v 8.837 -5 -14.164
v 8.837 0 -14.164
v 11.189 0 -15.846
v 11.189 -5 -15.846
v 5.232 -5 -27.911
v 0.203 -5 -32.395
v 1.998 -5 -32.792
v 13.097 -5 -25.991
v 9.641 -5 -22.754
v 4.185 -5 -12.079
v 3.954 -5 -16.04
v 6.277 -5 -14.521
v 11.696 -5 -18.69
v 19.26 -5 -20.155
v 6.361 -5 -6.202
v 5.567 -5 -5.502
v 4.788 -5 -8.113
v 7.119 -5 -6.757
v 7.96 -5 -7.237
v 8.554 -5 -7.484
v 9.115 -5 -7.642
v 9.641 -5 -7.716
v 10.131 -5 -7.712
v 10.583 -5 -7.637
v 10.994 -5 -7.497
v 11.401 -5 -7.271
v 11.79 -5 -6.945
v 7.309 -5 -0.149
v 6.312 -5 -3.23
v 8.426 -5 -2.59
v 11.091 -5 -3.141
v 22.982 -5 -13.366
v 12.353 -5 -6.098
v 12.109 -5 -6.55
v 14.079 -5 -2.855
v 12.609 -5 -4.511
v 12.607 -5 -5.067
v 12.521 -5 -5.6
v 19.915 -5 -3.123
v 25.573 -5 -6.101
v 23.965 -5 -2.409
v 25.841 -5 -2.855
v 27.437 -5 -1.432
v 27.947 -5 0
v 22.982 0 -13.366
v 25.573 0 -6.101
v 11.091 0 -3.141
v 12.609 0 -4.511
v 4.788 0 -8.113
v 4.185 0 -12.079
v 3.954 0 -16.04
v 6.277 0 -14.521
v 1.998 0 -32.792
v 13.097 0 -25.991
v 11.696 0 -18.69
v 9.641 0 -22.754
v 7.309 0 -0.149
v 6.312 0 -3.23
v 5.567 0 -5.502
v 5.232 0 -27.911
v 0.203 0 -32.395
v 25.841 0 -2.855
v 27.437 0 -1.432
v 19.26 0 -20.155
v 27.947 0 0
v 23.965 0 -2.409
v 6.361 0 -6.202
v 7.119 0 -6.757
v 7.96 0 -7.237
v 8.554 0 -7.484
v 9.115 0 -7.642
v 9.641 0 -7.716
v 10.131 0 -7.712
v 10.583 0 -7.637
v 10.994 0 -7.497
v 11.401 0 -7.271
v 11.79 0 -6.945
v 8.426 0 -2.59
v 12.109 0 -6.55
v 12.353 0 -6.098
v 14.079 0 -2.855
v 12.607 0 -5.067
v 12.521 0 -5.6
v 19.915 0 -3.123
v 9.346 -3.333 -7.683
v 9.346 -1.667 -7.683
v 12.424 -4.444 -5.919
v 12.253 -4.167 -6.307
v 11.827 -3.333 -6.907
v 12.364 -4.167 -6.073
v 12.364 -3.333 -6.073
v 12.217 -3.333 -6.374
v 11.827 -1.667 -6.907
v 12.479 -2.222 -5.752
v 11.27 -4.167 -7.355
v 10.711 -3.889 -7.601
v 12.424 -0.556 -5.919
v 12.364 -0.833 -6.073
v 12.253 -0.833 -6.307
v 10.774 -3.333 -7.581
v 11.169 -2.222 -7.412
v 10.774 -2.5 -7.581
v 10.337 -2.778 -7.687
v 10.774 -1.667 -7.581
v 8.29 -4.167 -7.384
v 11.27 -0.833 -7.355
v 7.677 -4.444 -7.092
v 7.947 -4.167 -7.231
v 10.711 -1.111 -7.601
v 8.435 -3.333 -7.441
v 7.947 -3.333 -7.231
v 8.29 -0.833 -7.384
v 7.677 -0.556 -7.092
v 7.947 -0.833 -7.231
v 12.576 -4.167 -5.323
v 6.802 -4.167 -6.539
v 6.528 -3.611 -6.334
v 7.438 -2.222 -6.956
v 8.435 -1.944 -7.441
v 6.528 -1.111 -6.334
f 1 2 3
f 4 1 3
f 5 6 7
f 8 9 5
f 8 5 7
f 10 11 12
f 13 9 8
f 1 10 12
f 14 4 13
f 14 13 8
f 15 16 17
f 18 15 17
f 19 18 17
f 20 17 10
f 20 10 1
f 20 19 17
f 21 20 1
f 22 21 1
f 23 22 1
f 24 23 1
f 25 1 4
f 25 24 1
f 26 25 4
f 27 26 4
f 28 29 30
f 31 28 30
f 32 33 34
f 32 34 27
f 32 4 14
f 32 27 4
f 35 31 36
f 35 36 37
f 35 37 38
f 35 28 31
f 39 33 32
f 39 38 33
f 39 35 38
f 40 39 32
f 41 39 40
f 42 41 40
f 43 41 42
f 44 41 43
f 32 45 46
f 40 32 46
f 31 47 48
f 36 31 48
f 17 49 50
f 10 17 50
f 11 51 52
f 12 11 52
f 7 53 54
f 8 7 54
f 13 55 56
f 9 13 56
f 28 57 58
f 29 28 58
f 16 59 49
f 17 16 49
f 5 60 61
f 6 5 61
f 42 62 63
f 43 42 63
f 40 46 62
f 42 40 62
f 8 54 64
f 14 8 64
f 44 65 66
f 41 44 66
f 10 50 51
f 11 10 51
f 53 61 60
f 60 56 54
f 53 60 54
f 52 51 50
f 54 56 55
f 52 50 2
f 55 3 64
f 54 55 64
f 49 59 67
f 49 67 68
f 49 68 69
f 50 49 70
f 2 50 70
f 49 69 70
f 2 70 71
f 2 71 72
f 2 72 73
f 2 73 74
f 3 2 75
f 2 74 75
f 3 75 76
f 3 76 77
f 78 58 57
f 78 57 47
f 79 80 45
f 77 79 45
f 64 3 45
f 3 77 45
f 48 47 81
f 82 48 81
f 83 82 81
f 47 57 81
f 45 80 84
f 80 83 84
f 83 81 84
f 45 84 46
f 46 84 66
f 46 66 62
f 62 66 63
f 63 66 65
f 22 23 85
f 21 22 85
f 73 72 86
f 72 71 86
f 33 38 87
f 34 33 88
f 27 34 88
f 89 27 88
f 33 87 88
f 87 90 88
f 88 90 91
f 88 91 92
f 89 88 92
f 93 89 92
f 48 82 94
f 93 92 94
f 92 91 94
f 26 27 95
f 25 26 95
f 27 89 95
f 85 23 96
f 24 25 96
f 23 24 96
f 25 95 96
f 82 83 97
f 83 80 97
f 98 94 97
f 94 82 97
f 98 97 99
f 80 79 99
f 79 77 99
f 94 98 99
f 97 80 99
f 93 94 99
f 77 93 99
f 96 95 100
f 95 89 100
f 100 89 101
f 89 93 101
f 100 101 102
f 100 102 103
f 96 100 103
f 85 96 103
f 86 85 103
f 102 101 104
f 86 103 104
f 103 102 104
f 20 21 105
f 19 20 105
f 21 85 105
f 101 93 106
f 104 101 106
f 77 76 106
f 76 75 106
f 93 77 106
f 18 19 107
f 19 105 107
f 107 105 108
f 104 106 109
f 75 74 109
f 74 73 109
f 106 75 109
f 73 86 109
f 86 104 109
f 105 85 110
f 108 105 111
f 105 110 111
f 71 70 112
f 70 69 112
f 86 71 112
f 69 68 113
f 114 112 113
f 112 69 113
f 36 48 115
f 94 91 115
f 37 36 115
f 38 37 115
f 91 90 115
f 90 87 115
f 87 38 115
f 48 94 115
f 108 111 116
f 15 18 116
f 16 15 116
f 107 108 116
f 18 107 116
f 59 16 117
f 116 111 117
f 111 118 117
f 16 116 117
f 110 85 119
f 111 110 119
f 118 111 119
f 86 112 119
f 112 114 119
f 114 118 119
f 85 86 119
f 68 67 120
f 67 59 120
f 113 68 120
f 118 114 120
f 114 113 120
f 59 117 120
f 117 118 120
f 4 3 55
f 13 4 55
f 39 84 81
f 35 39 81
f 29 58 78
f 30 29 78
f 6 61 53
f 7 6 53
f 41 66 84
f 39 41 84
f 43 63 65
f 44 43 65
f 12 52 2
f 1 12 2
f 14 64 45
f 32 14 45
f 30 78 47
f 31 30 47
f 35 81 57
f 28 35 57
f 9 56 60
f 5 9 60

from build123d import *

# Parameters (mm, degrees)
F1_DEPTH = 5


with BuildPart() as f1:
    # F0 (on Front) → F1 (new body)
    with BuildSketch(Plane.XZ):
        with BuildLine():
            Line((14.079286, -2.855276), (7.309372, -0.148515))
            Line((7.309372, -0.148515), (6.311895, -3.230274))
            Line((6.311895, -3.230274), (8.425951, -2.590102))
            Line((8.425951, -2.590102), (11.090854, -3.140948))
            Line((11.090854, -3.140948), (12.609402, -4.510618))
            add(Edge.make_bspline(
                [(12.609402, -4.510618), (12.809735, -7.270896), (9.862116, -9.607936), (5.567014, -5.502325)],
                knots=[0, 0, 0, 0, 7.111871, 7.111871, 7.111871, 7.111871], degree=3))
            Line((5.567014, -5.502325), (4.788001, -8.113072))
            Line((4.788001, -8.113072), (4.184787, -12.078794))
            Line((4.184787, -12.078794), (3.954032, -16.039545))
            Line((3.954032, -16.039545), (6.276517, -14.520998))
            Line((6.276517, -14.520998), (8.837205, -14.163692))
            Line((8.837205, -14.163692), (11.189465, -15.846005))
            Line((11.189465, -15.846005), (11.695648, -18.689562))
            Line((11.695648, -18.689562), (9.641142, -22.753909))
            Line((9.641142, -22.753909), (5.231907, -27.910765))
            Line((5.231907, -27.910765), (0.20325, -32.395359))
            Line((0.20325, -32.395359), (1.997939, -32.792404))
            Line((1.997939, -32.792404), (13.096696, -25.990801))
            Line((13.096696, -25.990801), (19.260213, -20.154811))
            Line((19.260213, -20.154811), (22.982145, -13.366009))
            Line((22.982145, -13.366009), (25.572609, -6.1008))
            Line((25.572609, -6.1008), (25.840588, -2.855276))
            Line((25.840588, -2.855276), (27.436723, -1.431831))
            Line((27.436723, -1.431831), (27.947253, 0))
            Line((27.947253, 0), (23.964735, -2.408644))
            Line((23.964735, -2.408644), (19.915273, -3.123255))
            Line((19.915273, -3.123255), (14.079286, -2.855276))
        make_face()
    extrude(amount=F1_DEPTH)


solid = f1.part
